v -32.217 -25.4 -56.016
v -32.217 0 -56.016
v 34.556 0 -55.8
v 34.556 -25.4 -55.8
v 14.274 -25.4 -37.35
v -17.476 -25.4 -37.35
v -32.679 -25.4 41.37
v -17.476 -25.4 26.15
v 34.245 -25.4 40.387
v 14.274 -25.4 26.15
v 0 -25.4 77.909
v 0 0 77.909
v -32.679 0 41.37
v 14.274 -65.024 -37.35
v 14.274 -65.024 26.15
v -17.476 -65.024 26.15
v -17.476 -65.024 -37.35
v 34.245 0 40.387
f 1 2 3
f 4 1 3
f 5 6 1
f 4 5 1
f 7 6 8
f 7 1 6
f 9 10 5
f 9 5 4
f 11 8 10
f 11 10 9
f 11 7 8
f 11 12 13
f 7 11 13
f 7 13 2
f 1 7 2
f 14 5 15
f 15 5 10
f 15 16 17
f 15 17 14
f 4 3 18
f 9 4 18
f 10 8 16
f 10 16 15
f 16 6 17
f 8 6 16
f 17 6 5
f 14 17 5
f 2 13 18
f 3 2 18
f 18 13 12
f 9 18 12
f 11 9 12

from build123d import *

# Parameters (mm, degrees)
F1_DEPTH = 25.4
F2_W     = 31.75
F2_H     = 63.5
F3_DEPTH = 39.624


with BuildPart() as f1:
    # F0 (on Front) → F1 (new body)
    with BuildSketch(Plane.XZ):
        Polygon((-32.678649, 41.369968), (-32.216675, -56.016259), (34.556333, -55.800427), (34.245424, 40.38674), (0, 77.908613), align=None)
    extrude(amount=F1_DEPTH)

    # F2 (on face) → F3 (join)
    with BuildSketch(Plane.XZ.offset(25.4)):
        with Locations((-1.600679, -5.599995)):
            Rectangle(F2_W, F2_H)
    extrude(amount=F3_DEPTH)


solid = f1.part
